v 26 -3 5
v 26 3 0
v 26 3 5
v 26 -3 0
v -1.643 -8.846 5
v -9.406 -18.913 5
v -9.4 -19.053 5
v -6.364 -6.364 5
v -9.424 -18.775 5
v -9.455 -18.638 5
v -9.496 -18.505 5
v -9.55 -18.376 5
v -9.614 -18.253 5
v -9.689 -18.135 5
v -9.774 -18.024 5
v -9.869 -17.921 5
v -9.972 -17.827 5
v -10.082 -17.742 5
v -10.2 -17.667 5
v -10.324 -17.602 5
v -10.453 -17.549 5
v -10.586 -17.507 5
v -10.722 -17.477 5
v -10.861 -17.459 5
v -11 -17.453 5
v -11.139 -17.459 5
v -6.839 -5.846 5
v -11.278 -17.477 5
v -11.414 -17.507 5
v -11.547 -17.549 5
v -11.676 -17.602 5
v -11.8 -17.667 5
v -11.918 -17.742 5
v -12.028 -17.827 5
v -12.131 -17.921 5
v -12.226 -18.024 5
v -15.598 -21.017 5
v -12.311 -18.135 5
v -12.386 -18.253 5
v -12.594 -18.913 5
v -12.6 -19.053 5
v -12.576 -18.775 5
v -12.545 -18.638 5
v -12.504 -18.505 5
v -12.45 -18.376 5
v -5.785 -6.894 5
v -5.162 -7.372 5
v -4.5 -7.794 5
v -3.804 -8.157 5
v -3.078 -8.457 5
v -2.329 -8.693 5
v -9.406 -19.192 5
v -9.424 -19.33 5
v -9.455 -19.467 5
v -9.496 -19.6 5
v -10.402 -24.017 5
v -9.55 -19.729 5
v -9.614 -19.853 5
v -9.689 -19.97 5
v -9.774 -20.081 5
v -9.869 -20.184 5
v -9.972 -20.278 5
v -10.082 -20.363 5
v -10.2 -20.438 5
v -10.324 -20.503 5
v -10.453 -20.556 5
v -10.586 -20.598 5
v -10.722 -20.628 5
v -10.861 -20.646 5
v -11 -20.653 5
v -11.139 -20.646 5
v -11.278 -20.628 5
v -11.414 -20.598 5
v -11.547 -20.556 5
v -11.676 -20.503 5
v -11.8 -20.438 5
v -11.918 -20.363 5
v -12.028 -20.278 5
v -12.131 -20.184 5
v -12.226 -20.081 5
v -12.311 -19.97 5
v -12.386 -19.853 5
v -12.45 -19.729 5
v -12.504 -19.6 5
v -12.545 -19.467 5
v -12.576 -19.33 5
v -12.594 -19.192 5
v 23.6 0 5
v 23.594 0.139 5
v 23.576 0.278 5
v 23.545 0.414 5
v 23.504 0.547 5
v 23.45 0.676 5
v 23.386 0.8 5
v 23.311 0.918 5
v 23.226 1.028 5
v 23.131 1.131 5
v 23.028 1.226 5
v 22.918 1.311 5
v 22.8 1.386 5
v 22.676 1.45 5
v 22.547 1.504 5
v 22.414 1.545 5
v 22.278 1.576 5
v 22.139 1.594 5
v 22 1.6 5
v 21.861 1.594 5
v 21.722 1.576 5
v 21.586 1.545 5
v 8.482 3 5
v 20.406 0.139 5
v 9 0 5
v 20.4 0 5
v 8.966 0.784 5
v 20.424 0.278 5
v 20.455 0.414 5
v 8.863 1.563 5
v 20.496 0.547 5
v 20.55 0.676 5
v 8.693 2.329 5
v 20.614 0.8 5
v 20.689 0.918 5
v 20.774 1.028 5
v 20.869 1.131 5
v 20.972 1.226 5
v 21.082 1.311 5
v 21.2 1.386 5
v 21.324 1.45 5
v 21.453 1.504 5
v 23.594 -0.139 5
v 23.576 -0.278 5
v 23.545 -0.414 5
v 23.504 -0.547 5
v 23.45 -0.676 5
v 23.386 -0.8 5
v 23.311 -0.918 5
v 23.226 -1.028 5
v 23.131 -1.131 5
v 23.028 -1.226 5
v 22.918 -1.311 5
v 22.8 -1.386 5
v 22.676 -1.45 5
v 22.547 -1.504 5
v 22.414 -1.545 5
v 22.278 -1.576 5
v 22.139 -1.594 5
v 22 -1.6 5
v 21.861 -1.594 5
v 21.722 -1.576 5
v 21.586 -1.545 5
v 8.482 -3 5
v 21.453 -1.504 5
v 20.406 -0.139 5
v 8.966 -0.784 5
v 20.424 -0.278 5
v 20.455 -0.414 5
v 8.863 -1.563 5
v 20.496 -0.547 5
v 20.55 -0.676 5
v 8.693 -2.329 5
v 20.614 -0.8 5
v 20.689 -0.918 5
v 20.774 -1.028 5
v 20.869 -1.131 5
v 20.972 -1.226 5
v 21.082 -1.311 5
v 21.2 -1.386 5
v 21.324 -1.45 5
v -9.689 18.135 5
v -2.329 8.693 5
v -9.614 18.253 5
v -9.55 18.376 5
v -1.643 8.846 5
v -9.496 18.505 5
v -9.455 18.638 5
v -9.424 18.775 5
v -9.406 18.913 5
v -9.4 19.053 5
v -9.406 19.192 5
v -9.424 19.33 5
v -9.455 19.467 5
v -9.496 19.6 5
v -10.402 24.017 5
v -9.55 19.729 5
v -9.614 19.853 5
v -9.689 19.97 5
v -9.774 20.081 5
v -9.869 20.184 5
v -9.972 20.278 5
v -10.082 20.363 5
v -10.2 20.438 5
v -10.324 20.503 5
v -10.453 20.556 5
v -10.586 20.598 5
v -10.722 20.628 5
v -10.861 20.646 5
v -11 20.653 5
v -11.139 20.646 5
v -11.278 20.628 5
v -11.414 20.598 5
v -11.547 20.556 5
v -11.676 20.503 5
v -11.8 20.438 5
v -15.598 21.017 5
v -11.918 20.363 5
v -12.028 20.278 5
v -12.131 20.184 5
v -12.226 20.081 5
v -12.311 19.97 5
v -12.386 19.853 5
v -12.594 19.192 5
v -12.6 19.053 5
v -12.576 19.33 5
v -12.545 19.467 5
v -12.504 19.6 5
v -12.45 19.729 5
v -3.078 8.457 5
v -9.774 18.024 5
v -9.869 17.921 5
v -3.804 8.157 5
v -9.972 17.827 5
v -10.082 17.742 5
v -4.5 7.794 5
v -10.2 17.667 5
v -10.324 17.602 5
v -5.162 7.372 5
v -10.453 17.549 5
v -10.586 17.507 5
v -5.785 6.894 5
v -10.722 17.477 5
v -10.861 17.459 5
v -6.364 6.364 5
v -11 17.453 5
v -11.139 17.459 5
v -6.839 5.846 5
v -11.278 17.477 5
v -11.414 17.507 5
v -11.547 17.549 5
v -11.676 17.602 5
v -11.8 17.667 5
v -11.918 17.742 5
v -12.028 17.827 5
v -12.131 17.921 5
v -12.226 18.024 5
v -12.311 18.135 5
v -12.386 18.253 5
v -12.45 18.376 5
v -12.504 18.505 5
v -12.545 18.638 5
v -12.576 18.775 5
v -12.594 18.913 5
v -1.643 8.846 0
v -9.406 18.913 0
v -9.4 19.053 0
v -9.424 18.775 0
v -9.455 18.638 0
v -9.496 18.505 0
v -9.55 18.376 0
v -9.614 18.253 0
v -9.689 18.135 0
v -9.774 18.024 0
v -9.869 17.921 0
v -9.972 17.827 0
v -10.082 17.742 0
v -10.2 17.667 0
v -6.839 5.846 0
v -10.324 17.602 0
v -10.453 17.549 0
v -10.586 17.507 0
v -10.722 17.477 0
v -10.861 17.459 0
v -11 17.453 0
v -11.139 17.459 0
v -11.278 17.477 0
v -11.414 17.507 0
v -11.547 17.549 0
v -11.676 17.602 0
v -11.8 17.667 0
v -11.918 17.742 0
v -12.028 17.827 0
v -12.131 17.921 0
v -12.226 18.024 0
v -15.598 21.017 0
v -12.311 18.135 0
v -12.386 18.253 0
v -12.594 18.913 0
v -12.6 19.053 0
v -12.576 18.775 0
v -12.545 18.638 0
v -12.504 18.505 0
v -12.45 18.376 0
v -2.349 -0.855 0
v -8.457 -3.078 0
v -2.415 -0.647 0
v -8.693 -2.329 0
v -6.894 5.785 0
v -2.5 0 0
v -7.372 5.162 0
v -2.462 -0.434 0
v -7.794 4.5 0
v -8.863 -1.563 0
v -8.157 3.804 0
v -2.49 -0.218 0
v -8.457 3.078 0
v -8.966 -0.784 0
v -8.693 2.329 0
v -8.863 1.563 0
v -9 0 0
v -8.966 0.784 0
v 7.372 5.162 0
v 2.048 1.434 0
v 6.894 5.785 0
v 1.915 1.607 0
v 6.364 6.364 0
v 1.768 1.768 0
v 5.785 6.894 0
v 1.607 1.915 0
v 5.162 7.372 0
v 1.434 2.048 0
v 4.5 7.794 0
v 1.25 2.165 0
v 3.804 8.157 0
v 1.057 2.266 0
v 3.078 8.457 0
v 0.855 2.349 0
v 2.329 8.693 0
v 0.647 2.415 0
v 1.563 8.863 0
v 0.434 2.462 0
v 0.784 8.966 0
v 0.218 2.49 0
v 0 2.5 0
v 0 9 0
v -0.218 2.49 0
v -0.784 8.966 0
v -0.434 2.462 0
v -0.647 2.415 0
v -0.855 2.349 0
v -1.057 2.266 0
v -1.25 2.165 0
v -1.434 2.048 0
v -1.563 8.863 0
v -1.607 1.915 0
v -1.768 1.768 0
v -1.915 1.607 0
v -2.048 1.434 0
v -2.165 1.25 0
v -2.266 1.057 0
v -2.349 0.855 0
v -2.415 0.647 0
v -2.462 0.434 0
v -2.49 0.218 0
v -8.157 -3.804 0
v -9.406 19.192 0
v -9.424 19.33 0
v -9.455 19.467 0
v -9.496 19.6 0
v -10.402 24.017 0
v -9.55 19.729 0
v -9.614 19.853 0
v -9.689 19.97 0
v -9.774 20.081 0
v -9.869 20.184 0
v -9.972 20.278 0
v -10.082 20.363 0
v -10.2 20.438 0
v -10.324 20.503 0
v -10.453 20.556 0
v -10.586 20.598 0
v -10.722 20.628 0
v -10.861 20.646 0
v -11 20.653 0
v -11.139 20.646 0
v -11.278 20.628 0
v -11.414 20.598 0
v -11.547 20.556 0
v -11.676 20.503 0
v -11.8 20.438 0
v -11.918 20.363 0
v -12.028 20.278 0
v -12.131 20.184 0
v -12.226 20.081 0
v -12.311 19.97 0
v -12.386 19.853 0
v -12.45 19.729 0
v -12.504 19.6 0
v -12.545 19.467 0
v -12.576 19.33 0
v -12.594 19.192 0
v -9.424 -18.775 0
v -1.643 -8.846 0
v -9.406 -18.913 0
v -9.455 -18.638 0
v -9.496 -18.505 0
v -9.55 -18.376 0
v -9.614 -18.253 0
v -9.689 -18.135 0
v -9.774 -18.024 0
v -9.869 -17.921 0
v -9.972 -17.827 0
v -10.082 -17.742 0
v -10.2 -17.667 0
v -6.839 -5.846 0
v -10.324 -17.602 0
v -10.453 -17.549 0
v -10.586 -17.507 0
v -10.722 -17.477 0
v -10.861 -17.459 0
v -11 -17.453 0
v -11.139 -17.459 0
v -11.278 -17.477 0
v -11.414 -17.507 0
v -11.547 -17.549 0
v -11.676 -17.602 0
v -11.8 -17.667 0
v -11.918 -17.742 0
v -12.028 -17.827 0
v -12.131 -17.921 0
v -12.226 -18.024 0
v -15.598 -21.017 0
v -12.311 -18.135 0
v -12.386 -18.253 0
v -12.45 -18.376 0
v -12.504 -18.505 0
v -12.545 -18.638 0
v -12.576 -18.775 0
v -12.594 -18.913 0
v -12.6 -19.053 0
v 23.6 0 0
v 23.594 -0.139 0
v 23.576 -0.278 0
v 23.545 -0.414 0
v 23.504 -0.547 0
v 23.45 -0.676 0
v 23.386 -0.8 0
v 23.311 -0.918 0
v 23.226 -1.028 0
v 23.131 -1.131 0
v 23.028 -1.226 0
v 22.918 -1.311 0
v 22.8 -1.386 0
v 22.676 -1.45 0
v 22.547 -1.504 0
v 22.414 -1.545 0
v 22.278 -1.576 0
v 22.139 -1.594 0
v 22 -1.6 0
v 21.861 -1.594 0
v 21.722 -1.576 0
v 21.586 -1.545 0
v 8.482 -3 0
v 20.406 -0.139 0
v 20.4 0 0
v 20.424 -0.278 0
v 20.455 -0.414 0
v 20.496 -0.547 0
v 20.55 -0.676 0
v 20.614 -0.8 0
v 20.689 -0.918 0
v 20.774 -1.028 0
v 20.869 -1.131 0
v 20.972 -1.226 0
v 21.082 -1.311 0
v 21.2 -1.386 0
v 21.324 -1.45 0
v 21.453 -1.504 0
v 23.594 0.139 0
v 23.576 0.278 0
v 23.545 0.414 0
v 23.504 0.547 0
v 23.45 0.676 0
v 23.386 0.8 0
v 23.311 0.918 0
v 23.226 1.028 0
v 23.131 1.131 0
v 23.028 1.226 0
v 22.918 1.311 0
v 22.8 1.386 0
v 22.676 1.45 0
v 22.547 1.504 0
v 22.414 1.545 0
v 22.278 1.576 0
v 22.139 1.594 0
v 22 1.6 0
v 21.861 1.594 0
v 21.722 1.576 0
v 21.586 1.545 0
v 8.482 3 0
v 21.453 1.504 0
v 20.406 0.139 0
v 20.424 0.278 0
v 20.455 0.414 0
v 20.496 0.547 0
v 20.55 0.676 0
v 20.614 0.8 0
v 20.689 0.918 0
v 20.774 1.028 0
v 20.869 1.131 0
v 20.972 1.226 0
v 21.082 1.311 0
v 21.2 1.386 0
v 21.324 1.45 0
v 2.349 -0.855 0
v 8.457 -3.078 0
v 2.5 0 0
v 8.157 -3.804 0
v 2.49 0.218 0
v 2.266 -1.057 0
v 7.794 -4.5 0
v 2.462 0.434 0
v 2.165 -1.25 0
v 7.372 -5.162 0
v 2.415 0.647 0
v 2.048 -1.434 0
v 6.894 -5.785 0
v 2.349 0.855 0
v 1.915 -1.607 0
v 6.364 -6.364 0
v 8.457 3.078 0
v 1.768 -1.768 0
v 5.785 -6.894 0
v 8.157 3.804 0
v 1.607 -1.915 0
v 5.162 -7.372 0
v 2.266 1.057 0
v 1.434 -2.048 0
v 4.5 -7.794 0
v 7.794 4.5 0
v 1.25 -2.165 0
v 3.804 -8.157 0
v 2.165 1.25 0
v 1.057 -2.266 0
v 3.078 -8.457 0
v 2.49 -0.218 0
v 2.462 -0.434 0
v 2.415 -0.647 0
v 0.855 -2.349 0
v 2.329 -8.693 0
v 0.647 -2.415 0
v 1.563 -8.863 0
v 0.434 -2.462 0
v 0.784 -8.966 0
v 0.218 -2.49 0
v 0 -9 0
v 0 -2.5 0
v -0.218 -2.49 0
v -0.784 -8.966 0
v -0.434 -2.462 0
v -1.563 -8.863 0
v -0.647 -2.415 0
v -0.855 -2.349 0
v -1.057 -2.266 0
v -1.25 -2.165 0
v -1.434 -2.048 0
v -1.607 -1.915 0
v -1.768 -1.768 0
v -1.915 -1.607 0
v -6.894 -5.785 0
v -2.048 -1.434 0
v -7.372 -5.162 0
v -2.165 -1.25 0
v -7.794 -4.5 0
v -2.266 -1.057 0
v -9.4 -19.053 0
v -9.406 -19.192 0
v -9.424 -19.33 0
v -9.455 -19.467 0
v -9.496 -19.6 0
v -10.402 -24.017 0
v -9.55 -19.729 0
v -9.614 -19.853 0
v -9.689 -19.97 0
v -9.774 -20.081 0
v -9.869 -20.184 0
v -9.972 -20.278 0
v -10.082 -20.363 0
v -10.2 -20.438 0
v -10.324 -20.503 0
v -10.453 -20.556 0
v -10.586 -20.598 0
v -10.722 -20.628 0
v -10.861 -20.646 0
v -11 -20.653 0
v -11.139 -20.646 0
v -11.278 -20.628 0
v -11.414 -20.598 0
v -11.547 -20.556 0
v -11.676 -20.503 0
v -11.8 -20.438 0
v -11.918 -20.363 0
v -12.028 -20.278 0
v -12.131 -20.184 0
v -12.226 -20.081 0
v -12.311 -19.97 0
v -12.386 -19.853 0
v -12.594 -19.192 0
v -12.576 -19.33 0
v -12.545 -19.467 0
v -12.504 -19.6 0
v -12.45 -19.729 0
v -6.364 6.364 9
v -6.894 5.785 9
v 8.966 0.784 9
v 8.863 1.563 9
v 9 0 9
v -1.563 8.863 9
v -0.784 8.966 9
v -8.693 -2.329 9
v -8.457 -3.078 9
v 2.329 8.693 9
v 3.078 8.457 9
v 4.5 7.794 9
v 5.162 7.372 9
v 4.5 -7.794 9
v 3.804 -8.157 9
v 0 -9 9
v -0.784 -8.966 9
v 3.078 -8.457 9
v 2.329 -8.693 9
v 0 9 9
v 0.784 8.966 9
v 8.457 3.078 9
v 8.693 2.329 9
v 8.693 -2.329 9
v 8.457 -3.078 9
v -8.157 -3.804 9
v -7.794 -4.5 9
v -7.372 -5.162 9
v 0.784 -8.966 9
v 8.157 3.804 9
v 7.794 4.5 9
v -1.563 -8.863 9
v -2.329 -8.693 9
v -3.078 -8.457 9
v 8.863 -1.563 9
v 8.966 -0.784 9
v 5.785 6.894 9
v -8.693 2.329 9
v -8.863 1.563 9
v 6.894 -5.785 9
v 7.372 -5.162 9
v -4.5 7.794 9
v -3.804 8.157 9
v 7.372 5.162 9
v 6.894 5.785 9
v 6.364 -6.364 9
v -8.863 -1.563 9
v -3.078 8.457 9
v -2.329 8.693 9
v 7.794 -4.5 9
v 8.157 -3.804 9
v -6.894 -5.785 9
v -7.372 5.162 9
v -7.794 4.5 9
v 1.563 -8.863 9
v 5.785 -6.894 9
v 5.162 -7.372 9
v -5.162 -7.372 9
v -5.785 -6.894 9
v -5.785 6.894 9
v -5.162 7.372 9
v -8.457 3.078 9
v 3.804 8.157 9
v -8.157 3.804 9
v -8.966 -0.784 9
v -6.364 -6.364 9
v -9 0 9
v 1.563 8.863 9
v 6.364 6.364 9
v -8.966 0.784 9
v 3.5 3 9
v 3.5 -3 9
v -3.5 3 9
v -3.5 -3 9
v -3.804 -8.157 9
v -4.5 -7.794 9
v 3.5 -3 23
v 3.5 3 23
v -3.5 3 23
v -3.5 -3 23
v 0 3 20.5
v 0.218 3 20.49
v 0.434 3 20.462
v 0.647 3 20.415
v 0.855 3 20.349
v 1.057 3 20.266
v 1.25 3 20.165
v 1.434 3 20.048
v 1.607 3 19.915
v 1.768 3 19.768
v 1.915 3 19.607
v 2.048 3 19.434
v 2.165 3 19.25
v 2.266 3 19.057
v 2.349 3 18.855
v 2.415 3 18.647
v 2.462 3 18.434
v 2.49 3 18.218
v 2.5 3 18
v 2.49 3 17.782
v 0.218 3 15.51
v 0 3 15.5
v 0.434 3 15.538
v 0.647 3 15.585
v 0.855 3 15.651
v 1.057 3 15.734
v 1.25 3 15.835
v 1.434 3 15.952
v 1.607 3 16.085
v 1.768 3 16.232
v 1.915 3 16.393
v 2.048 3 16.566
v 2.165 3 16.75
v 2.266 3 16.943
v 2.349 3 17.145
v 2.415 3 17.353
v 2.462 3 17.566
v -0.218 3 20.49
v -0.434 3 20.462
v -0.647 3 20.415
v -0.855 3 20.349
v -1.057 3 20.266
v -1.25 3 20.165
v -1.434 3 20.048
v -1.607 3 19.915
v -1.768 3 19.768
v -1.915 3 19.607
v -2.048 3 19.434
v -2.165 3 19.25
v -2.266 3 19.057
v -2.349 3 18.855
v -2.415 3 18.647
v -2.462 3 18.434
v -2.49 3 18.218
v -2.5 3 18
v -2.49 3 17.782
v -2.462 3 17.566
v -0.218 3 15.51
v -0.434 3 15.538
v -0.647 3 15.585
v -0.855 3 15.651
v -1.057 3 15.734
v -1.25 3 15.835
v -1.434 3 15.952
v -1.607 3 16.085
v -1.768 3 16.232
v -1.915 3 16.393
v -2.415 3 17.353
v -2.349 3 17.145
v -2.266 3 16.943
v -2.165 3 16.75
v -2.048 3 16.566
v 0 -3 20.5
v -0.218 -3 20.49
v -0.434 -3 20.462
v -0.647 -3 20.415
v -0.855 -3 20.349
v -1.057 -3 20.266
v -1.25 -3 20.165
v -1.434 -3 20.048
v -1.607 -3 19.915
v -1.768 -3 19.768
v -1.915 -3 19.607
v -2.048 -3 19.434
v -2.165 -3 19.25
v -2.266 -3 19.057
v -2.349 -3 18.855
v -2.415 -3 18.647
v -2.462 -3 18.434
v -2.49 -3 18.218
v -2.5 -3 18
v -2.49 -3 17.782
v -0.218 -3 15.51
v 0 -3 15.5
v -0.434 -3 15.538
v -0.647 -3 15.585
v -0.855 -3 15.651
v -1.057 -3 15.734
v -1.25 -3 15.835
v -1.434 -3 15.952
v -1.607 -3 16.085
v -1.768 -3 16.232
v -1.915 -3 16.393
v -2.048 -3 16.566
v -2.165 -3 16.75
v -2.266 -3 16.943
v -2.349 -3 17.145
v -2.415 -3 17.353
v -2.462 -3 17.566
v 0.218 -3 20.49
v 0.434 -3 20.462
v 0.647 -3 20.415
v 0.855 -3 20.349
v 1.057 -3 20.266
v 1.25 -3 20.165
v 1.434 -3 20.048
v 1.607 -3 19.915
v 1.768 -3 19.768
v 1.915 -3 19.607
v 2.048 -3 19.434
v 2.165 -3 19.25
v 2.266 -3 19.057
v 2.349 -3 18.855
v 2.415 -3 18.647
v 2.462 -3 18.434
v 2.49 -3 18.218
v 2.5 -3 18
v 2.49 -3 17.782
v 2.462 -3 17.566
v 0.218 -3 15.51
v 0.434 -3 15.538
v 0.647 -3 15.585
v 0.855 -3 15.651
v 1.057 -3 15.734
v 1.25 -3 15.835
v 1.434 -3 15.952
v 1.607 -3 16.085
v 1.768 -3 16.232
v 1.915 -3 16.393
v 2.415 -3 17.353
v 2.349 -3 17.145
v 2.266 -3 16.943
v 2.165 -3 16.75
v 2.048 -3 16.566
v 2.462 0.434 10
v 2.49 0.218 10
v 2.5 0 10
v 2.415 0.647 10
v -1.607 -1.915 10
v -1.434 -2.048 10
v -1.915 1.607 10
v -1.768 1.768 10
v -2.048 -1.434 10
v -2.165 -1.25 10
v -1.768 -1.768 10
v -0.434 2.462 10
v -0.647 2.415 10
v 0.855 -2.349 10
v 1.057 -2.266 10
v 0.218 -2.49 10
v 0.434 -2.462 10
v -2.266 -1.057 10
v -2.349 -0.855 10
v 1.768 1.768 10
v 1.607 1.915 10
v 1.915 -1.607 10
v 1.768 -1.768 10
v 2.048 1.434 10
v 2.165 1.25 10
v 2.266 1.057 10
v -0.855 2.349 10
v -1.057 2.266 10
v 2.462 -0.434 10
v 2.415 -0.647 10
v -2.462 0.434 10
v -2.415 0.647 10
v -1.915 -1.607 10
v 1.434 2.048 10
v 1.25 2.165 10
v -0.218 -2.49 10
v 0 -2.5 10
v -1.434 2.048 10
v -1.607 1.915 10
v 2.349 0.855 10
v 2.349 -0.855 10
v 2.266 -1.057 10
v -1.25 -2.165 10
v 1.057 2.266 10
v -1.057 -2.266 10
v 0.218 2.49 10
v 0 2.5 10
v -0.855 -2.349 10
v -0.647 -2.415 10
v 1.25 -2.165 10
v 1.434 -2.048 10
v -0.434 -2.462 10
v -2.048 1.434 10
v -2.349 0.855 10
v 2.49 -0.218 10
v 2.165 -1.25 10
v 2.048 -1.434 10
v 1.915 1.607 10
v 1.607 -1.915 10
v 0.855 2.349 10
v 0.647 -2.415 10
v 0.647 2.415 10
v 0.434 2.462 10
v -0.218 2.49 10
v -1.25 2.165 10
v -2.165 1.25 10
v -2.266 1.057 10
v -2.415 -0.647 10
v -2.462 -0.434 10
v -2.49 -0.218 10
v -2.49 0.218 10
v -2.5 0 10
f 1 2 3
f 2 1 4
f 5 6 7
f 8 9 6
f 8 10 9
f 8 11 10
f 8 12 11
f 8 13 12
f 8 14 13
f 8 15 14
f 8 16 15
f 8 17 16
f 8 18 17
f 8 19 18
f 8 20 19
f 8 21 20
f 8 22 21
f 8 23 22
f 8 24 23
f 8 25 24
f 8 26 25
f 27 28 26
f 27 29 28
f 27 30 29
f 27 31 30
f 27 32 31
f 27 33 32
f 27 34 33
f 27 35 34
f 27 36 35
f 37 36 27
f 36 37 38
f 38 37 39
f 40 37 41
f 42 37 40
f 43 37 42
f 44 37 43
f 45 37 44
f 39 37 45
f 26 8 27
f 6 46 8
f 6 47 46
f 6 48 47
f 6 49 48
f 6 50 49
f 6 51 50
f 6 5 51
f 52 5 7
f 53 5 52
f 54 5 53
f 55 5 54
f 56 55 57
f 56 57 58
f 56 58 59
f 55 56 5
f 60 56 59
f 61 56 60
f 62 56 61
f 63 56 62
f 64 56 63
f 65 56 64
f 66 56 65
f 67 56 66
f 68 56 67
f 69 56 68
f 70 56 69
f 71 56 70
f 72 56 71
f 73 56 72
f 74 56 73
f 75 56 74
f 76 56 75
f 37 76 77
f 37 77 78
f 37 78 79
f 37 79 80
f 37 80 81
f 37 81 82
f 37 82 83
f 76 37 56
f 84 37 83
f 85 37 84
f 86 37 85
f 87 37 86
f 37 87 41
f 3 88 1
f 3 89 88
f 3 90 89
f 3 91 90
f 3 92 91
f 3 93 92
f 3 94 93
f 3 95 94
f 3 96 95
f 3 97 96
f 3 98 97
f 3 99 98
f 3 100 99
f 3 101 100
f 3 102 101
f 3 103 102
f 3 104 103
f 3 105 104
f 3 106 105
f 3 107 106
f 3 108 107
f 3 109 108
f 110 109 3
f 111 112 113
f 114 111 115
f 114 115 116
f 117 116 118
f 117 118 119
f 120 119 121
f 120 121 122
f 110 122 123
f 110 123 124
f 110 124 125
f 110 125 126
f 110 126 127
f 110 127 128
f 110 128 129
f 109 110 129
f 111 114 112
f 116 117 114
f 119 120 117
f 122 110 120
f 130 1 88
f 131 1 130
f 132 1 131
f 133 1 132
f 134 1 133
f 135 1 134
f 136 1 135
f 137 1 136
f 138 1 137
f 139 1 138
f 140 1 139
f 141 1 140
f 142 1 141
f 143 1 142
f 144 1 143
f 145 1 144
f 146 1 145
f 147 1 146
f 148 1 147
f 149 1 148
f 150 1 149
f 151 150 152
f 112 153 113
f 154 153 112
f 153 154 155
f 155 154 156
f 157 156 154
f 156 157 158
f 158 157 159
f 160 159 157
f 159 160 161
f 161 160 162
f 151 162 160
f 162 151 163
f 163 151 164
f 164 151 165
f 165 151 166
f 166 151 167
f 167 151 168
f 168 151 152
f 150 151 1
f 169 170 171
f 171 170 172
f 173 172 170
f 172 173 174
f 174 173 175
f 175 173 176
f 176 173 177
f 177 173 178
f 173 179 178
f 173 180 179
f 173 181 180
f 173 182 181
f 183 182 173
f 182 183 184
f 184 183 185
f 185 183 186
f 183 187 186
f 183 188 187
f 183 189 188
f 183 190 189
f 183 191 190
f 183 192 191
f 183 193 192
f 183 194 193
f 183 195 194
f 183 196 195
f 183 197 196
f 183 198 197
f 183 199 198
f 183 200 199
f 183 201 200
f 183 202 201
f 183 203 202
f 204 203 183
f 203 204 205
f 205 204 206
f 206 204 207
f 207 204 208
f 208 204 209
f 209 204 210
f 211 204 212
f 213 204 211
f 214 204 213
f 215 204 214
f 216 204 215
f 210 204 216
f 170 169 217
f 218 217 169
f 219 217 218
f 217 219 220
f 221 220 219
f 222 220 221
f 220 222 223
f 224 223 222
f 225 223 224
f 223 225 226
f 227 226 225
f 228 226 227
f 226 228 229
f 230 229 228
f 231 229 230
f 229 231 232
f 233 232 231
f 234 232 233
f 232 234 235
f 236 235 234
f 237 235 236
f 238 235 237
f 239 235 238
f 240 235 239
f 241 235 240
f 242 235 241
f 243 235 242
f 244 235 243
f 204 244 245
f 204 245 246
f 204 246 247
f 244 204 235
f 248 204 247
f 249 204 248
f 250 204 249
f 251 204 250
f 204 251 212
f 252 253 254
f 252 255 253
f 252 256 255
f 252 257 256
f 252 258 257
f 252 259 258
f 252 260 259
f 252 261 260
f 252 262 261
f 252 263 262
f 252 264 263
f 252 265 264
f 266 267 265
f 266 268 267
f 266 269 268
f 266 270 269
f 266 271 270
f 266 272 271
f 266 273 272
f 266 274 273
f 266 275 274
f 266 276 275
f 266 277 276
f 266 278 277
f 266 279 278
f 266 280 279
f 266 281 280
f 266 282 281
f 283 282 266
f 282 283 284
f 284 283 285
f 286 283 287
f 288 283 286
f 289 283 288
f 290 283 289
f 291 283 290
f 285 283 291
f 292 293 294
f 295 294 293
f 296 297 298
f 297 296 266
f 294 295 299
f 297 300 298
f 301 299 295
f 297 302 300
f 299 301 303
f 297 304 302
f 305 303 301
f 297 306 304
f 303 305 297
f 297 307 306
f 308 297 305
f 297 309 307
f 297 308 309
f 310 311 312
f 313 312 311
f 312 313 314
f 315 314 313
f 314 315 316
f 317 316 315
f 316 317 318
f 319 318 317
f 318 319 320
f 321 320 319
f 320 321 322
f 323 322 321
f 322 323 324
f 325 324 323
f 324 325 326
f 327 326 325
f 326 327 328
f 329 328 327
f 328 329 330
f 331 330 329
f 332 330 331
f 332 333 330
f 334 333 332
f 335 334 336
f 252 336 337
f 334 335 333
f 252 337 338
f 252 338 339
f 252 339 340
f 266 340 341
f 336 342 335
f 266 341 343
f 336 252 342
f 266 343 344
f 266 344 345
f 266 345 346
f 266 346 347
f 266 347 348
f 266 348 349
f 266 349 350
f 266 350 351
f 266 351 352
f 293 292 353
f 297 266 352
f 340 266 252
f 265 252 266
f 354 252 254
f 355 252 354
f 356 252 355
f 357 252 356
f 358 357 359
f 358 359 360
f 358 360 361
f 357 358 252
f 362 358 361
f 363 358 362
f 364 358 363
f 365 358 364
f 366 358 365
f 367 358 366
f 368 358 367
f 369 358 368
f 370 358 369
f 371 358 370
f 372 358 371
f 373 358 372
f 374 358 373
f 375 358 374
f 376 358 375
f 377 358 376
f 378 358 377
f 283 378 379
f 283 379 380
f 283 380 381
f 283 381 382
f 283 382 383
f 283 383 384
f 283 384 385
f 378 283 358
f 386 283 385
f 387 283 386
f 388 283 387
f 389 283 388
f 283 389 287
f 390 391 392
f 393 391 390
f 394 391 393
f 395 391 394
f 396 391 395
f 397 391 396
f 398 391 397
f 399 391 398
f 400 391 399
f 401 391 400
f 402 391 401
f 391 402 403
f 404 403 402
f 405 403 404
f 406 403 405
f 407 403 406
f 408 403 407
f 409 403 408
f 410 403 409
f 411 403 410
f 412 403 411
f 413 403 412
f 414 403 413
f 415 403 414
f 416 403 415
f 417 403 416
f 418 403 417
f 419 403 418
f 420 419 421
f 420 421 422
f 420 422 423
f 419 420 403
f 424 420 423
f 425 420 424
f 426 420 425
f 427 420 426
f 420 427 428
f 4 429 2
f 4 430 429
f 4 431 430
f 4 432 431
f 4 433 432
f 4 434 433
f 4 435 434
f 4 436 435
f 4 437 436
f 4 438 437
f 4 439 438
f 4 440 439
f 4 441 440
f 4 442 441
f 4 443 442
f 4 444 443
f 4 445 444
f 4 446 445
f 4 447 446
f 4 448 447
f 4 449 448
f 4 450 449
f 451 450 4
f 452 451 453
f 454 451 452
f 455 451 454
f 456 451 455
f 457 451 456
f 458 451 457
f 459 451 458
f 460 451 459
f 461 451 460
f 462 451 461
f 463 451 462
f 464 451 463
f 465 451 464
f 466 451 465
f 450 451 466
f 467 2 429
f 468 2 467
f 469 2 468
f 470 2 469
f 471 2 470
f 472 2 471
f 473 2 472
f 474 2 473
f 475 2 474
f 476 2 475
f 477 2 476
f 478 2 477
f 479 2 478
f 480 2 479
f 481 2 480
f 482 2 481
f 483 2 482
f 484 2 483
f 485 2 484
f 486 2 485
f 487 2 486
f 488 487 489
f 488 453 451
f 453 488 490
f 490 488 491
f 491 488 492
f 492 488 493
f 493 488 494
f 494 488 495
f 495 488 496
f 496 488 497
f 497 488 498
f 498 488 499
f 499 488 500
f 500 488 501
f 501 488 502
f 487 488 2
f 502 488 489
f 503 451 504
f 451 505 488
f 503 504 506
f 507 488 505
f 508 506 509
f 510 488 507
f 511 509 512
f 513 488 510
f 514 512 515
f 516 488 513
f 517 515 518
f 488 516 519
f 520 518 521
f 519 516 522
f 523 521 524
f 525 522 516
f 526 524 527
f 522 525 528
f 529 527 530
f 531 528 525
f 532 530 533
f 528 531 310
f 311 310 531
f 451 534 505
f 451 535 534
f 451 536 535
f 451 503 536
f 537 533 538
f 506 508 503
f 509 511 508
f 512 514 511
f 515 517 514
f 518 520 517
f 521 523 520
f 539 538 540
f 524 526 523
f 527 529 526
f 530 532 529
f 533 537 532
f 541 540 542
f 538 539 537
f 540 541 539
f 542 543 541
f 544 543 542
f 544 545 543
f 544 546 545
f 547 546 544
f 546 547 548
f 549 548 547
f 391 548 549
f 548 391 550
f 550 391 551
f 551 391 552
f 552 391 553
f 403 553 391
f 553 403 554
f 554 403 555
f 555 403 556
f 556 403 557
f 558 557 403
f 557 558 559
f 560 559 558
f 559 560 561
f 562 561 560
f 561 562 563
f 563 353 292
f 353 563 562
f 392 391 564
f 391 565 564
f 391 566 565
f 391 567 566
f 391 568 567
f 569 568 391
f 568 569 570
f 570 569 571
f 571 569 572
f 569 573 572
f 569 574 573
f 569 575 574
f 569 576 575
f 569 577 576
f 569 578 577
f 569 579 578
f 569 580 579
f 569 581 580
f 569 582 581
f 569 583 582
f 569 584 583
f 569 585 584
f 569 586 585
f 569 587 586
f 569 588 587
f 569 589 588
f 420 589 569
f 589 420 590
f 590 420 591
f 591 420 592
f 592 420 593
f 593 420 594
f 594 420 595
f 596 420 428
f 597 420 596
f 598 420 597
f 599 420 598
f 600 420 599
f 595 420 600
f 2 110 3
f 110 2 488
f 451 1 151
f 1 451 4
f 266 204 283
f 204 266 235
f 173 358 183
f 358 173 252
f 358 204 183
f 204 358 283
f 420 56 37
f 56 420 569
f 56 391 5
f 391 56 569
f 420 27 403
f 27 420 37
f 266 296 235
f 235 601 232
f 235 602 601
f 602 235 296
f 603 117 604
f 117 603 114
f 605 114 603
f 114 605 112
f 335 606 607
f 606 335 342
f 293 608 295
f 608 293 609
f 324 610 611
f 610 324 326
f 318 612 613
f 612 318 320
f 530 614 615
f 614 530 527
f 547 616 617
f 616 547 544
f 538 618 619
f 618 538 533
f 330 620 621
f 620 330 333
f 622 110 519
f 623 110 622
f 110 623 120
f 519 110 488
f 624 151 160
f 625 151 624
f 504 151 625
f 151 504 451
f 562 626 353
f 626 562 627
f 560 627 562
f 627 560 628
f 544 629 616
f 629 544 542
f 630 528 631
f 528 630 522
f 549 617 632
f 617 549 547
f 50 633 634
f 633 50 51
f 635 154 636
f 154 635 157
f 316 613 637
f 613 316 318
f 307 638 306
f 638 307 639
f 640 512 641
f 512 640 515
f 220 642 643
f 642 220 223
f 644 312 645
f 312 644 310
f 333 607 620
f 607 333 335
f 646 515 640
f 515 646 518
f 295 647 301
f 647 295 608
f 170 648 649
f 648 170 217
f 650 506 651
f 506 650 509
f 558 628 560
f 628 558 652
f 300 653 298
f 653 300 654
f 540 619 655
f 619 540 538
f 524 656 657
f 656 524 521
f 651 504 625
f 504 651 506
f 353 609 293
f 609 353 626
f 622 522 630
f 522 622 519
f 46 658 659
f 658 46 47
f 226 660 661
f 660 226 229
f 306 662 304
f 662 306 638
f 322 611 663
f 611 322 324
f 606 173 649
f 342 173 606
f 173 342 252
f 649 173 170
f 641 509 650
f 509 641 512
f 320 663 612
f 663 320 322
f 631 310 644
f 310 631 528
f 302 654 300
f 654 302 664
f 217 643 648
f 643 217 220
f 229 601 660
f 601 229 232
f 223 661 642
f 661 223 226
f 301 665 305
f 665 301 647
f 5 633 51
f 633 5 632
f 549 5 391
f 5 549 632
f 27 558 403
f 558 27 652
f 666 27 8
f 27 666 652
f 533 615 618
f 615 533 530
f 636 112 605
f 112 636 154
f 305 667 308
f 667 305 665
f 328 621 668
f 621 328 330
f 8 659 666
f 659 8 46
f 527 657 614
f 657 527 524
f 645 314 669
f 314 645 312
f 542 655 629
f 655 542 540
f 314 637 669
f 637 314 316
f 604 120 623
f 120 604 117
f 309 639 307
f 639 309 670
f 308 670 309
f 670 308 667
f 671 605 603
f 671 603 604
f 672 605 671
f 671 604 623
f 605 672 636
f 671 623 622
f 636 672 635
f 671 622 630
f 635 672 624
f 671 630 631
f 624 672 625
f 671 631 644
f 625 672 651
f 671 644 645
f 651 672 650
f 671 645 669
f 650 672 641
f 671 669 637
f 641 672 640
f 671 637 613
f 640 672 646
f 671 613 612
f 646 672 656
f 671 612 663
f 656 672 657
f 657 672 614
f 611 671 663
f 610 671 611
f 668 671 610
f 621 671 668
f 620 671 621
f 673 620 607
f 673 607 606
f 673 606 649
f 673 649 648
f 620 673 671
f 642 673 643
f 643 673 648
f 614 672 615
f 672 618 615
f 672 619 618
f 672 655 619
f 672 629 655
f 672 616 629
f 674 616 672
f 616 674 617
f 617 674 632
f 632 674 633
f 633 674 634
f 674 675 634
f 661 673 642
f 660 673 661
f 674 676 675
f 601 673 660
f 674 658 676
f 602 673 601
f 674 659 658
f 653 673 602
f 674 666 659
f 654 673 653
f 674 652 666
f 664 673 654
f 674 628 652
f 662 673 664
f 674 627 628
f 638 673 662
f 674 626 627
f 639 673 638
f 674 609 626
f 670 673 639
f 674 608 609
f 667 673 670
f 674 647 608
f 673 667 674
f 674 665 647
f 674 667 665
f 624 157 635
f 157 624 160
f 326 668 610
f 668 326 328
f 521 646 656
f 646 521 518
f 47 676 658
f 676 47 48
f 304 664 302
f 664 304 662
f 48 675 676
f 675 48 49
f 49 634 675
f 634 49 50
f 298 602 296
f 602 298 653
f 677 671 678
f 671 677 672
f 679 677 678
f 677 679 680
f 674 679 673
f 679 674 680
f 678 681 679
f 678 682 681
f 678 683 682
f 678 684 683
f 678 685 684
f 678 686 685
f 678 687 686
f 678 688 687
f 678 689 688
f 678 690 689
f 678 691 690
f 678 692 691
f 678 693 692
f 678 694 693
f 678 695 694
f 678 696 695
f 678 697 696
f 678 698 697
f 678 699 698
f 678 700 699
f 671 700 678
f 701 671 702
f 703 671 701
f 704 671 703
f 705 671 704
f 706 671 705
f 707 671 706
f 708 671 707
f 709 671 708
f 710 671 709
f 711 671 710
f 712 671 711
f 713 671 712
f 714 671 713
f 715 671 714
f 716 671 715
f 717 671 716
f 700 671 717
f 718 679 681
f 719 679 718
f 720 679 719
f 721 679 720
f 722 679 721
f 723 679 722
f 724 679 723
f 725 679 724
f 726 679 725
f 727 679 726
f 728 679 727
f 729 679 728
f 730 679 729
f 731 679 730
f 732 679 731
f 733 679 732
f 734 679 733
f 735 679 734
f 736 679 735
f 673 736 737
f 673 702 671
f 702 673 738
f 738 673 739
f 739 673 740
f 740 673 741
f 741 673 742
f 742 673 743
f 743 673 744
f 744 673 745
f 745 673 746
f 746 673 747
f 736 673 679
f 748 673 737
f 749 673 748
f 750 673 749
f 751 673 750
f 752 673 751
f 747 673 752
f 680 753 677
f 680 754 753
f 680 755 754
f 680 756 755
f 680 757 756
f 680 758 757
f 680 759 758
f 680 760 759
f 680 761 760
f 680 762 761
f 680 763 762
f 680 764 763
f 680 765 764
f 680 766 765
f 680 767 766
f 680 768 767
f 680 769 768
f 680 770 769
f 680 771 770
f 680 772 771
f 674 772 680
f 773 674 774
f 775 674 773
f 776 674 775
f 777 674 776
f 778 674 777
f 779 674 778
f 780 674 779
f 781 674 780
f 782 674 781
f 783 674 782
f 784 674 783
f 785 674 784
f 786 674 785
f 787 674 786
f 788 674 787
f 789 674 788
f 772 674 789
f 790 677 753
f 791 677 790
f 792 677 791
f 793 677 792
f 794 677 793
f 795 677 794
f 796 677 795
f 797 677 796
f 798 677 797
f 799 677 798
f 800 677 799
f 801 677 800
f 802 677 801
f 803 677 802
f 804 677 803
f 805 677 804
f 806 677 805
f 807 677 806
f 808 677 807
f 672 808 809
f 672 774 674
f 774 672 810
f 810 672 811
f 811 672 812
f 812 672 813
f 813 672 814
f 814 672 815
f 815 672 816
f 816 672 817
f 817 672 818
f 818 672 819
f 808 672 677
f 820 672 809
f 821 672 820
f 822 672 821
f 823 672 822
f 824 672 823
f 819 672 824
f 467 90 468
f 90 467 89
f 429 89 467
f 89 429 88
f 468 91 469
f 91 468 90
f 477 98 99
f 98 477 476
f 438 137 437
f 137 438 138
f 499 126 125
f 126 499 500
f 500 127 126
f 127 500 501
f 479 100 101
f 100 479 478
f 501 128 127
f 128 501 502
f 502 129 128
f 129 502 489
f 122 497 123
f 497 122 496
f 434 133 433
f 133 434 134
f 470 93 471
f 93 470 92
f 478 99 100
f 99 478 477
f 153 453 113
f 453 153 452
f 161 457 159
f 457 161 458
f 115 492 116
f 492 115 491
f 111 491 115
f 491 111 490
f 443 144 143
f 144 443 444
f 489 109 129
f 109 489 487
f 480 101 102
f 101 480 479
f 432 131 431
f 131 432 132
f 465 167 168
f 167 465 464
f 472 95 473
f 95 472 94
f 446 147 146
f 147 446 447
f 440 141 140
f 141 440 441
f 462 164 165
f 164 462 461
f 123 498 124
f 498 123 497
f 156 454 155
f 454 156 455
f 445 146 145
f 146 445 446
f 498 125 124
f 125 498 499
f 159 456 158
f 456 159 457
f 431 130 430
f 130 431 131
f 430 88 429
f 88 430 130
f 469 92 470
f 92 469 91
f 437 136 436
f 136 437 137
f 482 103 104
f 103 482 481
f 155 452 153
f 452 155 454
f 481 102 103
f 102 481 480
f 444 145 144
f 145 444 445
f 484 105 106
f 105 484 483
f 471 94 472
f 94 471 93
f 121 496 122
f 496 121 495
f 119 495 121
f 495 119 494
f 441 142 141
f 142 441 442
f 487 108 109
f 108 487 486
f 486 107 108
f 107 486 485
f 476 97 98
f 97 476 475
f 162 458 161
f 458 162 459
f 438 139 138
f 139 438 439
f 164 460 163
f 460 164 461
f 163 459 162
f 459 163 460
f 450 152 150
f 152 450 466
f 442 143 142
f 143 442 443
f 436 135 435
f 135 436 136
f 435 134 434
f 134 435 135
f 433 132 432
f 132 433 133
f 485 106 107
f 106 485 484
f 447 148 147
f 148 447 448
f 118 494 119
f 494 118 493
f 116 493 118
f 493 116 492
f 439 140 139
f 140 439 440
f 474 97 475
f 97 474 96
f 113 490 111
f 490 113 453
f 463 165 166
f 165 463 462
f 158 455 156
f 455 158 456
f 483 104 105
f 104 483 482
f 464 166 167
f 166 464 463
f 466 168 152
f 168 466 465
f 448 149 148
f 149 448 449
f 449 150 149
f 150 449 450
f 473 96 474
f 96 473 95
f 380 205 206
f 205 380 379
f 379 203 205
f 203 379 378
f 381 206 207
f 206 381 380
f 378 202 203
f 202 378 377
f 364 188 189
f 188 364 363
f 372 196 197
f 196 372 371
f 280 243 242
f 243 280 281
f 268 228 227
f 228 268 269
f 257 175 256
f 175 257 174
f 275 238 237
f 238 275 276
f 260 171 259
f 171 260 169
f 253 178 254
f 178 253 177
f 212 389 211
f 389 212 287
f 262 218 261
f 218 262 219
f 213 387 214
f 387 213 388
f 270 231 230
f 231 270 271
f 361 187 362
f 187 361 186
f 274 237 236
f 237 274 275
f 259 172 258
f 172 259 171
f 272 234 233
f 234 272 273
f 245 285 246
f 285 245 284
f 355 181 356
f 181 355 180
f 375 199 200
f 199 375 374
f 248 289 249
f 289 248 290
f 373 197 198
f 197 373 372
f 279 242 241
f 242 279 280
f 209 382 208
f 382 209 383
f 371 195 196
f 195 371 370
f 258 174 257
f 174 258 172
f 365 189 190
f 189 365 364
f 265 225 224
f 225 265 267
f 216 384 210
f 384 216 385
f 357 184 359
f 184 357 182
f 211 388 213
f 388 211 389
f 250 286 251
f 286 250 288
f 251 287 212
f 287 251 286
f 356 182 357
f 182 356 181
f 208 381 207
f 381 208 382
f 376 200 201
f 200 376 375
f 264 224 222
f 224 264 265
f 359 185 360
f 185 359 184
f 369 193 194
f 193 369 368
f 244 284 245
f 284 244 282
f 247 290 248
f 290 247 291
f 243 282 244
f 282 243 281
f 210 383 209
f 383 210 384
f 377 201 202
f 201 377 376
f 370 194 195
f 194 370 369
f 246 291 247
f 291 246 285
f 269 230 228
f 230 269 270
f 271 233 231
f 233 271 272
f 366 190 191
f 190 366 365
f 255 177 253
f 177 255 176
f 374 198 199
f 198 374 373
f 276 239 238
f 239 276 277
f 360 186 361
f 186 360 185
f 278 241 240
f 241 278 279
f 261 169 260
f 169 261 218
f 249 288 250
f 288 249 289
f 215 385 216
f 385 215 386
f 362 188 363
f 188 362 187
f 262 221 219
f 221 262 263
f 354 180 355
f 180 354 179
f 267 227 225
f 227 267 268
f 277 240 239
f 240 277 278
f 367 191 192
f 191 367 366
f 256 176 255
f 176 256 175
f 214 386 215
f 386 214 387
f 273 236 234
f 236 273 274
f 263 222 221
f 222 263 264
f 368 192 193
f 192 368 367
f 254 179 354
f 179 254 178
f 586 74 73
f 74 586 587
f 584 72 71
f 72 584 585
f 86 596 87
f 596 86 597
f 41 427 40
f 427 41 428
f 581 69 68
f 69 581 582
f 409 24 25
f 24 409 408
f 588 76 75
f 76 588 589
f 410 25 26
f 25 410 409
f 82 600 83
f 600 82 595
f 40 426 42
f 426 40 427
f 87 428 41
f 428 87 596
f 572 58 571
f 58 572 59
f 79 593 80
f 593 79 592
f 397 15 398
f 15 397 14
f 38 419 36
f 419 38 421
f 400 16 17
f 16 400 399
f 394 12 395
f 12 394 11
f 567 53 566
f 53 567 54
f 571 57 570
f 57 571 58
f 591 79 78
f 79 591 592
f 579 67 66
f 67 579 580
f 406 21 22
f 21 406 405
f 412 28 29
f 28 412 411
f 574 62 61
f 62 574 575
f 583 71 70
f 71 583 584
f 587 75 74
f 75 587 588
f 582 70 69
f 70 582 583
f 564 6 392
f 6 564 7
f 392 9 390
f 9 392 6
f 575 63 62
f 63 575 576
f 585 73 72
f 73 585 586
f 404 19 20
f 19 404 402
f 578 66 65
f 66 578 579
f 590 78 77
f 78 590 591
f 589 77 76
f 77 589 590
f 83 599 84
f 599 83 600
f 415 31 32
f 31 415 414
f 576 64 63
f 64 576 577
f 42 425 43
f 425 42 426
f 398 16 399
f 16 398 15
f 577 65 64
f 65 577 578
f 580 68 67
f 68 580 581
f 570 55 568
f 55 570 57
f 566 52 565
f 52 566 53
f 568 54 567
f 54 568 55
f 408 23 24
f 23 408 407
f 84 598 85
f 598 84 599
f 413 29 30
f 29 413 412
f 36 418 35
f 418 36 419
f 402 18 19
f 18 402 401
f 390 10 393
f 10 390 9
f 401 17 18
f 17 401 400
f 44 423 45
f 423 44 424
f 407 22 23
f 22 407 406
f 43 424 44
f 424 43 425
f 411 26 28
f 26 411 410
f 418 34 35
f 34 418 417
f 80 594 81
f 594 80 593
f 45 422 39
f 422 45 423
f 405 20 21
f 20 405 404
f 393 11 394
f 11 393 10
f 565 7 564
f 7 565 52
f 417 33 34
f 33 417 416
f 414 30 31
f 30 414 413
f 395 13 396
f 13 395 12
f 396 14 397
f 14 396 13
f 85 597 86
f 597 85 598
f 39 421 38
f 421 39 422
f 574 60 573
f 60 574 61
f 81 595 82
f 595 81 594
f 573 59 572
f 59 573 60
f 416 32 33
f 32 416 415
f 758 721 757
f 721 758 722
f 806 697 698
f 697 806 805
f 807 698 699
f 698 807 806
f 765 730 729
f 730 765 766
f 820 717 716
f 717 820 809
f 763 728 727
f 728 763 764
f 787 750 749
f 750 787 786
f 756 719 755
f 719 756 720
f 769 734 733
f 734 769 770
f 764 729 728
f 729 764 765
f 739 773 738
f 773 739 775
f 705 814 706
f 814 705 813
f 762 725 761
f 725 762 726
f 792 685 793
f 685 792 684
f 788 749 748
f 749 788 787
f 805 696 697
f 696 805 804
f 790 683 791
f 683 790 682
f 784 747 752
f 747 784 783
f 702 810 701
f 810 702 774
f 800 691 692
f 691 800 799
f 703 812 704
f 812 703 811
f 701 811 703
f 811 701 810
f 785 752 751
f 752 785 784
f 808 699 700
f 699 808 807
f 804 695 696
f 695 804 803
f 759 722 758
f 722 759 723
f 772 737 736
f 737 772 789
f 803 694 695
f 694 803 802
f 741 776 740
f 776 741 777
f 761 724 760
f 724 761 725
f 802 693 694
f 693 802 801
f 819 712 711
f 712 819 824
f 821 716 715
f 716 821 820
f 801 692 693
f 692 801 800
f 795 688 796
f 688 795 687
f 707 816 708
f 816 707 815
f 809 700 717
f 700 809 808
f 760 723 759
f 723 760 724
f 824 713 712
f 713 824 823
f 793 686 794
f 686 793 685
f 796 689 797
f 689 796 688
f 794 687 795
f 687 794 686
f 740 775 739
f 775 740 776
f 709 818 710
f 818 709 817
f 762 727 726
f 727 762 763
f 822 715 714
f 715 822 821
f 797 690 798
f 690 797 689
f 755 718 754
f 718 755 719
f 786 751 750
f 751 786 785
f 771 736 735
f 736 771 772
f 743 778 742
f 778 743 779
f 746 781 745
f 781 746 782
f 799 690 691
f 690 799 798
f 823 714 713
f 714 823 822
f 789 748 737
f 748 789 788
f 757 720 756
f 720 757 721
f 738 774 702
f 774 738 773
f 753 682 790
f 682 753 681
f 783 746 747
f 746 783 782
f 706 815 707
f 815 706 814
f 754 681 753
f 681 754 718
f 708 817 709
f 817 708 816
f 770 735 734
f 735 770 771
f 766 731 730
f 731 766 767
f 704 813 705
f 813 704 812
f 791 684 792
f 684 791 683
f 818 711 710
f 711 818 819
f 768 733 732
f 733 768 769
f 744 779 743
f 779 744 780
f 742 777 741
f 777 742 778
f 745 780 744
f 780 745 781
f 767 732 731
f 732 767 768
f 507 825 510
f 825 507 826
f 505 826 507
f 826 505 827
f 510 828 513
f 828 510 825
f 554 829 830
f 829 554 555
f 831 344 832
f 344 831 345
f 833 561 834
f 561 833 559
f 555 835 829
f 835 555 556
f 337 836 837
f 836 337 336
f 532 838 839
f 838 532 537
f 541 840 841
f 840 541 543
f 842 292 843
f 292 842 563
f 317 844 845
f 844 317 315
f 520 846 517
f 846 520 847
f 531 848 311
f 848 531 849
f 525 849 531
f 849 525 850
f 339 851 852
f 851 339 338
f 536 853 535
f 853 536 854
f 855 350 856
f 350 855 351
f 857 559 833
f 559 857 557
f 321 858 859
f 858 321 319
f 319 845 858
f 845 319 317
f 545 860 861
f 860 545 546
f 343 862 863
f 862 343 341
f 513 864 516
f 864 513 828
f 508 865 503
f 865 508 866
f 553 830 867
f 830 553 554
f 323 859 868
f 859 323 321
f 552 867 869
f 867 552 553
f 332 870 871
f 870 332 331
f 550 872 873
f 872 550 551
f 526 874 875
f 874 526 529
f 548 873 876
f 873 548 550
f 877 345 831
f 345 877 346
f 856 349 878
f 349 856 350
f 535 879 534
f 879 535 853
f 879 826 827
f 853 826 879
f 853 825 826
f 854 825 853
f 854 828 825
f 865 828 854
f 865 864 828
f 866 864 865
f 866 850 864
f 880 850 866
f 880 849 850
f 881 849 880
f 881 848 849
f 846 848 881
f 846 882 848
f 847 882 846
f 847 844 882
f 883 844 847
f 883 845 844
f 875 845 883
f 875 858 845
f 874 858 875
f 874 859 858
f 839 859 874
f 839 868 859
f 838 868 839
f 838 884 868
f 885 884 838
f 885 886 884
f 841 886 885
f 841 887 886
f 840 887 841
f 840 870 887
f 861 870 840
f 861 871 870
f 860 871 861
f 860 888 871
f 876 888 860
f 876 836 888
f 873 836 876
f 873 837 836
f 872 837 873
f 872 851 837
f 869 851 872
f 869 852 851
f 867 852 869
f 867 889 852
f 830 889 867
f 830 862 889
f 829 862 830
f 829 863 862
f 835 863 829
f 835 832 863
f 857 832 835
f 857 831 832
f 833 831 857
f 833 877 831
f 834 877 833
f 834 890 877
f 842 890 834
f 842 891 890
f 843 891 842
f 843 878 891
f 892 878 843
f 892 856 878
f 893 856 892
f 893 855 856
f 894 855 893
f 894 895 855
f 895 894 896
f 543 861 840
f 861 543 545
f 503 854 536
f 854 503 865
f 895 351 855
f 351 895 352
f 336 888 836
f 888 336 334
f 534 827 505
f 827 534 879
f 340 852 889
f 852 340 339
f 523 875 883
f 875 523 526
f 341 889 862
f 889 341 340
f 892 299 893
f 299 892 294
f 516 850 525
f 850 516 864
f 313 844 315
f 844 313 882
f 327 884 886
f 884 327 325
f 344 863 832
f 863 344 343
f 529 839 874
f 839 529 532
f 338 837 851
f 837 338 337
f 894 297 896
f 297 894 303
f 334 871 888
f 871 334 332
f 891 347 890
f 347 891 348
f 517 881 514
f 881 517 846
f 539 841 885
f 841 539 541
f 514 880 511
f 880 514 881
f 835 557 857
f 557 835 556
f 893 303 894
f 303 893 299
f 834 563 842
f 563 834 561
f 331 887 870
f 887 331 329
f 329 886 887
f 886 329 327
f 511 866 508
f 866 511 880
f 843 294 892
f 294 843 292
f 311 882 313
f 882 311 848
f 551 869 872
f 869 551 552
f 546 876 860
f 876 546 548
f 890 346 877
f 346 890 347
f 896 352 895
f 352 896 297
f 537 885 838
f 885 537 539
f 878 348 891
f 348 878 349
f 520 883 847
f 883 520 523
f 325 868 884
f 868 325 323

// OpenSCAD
// ==========================================================
// HELIOS — Trifilar Suspension Yoke (anti-swing for capsule)
// One load-cell attachment at the top eyelet; three bridle
// wires fan out from the arms to 3 points 120° apart on the
// capsule's top rim. Single vertical load path (all 3 tensions
// sum into the one load cell) but rotation + sway are killed.
// Print PLA/PETG, ~30% infill, 3 walls. Tiny part.
// ==========================================================
$fn = 72;

// ---- parameters ----
HUB_D        = 18;    // central hub diameter
HUB_H        = 9;     // hub / arm thickness base
ARM_LEN      = 26;    // center -> bridle hole (more spread = stiffer against rotation)
ARM_W        = 6;     // arm width
ARM_TH       = 5;     // arm thickness
WIRE_HOLE_D  = 3.2;   // bridle wire holes (tie a knot/figure-8 under each)

EYE_POST_W   = 7;     // top eyelet post (X)
EYE_POST_TH  = 6;     // top eyelet post (Y)
EYE_POST_H   = 14;    // post height above hub
EYE_HOLE_D   = 5;     // load-cell hook / ring hole (horizontal)

CENTER_BORE  = 5;     // light vertical bore through hub (optional cable pass / weight save)

module yoke() {
    difference() {
        union() {
            cylinder(d = HUB_D, h = HUB_H);                 // hub
            for (a = [0:120:240])                           // 3 arms @120
                rotate([0,0,a])
                    translate([0, -ARM_W/2, 0])
                        cube([ARM_LEN, ARM_W, ARM_TH]);
            translate([-EYE_POST_W/2, -EYE_POST_TH/2, HUB_H])   // top eyelet post
                cube([EYE_POST_W, EYE_POST_TH, EYE_POST_H]);
        }
        // bridle wire holes at each arm tip
        for (a = [0:120:240])
            rotate([0,0,a])
                translate([ARM_LEN - 4, 0, -1])
                    cylinder(d = WIRE_HOLE_D, h = ARM_TH + 2);
        // horizontal eyelet hole through the top post (for the load-cell hook)
        translate([0, EYE_POST_TH/2 + 1, HUB_H + EYE_POST_H - EYE_HOLE_D])
            rotate([90,0,0])
                cylinder(d = EYE_HOLE_D, h = EYE_POST_TH + 2);
        // light center bore
        translate([0,0,-1]) cylinder(d = CENTER_BORE, h = HUB_H + 2);
    }
}
yoke();

// ==========================================================
// ASSEMBLY NOTES
// - Hook the load cell to the TOP eyelet (5mm hole).
// - Run 3 equal-length wires from the arm holes down to 3
//   points 120° apart on the capsule top rim (6.5" OD ≈ Ø165,
//   so rim radius ≈ 82.5mm).
// - Keep the yoke ~60–100mm above the cap: the taller/narrower
//   the cone, the more it resists rotation; wider = more sway
//   resistance. ~70mm is a good start.
// - Make the 3 wires EQUAL length so the capsule hangs plumb
//   and centered over the column (you have only 1.9mm clearance).
// - Take weight readings with the mixing fan OFF, on "stable".
// ==========================================================
